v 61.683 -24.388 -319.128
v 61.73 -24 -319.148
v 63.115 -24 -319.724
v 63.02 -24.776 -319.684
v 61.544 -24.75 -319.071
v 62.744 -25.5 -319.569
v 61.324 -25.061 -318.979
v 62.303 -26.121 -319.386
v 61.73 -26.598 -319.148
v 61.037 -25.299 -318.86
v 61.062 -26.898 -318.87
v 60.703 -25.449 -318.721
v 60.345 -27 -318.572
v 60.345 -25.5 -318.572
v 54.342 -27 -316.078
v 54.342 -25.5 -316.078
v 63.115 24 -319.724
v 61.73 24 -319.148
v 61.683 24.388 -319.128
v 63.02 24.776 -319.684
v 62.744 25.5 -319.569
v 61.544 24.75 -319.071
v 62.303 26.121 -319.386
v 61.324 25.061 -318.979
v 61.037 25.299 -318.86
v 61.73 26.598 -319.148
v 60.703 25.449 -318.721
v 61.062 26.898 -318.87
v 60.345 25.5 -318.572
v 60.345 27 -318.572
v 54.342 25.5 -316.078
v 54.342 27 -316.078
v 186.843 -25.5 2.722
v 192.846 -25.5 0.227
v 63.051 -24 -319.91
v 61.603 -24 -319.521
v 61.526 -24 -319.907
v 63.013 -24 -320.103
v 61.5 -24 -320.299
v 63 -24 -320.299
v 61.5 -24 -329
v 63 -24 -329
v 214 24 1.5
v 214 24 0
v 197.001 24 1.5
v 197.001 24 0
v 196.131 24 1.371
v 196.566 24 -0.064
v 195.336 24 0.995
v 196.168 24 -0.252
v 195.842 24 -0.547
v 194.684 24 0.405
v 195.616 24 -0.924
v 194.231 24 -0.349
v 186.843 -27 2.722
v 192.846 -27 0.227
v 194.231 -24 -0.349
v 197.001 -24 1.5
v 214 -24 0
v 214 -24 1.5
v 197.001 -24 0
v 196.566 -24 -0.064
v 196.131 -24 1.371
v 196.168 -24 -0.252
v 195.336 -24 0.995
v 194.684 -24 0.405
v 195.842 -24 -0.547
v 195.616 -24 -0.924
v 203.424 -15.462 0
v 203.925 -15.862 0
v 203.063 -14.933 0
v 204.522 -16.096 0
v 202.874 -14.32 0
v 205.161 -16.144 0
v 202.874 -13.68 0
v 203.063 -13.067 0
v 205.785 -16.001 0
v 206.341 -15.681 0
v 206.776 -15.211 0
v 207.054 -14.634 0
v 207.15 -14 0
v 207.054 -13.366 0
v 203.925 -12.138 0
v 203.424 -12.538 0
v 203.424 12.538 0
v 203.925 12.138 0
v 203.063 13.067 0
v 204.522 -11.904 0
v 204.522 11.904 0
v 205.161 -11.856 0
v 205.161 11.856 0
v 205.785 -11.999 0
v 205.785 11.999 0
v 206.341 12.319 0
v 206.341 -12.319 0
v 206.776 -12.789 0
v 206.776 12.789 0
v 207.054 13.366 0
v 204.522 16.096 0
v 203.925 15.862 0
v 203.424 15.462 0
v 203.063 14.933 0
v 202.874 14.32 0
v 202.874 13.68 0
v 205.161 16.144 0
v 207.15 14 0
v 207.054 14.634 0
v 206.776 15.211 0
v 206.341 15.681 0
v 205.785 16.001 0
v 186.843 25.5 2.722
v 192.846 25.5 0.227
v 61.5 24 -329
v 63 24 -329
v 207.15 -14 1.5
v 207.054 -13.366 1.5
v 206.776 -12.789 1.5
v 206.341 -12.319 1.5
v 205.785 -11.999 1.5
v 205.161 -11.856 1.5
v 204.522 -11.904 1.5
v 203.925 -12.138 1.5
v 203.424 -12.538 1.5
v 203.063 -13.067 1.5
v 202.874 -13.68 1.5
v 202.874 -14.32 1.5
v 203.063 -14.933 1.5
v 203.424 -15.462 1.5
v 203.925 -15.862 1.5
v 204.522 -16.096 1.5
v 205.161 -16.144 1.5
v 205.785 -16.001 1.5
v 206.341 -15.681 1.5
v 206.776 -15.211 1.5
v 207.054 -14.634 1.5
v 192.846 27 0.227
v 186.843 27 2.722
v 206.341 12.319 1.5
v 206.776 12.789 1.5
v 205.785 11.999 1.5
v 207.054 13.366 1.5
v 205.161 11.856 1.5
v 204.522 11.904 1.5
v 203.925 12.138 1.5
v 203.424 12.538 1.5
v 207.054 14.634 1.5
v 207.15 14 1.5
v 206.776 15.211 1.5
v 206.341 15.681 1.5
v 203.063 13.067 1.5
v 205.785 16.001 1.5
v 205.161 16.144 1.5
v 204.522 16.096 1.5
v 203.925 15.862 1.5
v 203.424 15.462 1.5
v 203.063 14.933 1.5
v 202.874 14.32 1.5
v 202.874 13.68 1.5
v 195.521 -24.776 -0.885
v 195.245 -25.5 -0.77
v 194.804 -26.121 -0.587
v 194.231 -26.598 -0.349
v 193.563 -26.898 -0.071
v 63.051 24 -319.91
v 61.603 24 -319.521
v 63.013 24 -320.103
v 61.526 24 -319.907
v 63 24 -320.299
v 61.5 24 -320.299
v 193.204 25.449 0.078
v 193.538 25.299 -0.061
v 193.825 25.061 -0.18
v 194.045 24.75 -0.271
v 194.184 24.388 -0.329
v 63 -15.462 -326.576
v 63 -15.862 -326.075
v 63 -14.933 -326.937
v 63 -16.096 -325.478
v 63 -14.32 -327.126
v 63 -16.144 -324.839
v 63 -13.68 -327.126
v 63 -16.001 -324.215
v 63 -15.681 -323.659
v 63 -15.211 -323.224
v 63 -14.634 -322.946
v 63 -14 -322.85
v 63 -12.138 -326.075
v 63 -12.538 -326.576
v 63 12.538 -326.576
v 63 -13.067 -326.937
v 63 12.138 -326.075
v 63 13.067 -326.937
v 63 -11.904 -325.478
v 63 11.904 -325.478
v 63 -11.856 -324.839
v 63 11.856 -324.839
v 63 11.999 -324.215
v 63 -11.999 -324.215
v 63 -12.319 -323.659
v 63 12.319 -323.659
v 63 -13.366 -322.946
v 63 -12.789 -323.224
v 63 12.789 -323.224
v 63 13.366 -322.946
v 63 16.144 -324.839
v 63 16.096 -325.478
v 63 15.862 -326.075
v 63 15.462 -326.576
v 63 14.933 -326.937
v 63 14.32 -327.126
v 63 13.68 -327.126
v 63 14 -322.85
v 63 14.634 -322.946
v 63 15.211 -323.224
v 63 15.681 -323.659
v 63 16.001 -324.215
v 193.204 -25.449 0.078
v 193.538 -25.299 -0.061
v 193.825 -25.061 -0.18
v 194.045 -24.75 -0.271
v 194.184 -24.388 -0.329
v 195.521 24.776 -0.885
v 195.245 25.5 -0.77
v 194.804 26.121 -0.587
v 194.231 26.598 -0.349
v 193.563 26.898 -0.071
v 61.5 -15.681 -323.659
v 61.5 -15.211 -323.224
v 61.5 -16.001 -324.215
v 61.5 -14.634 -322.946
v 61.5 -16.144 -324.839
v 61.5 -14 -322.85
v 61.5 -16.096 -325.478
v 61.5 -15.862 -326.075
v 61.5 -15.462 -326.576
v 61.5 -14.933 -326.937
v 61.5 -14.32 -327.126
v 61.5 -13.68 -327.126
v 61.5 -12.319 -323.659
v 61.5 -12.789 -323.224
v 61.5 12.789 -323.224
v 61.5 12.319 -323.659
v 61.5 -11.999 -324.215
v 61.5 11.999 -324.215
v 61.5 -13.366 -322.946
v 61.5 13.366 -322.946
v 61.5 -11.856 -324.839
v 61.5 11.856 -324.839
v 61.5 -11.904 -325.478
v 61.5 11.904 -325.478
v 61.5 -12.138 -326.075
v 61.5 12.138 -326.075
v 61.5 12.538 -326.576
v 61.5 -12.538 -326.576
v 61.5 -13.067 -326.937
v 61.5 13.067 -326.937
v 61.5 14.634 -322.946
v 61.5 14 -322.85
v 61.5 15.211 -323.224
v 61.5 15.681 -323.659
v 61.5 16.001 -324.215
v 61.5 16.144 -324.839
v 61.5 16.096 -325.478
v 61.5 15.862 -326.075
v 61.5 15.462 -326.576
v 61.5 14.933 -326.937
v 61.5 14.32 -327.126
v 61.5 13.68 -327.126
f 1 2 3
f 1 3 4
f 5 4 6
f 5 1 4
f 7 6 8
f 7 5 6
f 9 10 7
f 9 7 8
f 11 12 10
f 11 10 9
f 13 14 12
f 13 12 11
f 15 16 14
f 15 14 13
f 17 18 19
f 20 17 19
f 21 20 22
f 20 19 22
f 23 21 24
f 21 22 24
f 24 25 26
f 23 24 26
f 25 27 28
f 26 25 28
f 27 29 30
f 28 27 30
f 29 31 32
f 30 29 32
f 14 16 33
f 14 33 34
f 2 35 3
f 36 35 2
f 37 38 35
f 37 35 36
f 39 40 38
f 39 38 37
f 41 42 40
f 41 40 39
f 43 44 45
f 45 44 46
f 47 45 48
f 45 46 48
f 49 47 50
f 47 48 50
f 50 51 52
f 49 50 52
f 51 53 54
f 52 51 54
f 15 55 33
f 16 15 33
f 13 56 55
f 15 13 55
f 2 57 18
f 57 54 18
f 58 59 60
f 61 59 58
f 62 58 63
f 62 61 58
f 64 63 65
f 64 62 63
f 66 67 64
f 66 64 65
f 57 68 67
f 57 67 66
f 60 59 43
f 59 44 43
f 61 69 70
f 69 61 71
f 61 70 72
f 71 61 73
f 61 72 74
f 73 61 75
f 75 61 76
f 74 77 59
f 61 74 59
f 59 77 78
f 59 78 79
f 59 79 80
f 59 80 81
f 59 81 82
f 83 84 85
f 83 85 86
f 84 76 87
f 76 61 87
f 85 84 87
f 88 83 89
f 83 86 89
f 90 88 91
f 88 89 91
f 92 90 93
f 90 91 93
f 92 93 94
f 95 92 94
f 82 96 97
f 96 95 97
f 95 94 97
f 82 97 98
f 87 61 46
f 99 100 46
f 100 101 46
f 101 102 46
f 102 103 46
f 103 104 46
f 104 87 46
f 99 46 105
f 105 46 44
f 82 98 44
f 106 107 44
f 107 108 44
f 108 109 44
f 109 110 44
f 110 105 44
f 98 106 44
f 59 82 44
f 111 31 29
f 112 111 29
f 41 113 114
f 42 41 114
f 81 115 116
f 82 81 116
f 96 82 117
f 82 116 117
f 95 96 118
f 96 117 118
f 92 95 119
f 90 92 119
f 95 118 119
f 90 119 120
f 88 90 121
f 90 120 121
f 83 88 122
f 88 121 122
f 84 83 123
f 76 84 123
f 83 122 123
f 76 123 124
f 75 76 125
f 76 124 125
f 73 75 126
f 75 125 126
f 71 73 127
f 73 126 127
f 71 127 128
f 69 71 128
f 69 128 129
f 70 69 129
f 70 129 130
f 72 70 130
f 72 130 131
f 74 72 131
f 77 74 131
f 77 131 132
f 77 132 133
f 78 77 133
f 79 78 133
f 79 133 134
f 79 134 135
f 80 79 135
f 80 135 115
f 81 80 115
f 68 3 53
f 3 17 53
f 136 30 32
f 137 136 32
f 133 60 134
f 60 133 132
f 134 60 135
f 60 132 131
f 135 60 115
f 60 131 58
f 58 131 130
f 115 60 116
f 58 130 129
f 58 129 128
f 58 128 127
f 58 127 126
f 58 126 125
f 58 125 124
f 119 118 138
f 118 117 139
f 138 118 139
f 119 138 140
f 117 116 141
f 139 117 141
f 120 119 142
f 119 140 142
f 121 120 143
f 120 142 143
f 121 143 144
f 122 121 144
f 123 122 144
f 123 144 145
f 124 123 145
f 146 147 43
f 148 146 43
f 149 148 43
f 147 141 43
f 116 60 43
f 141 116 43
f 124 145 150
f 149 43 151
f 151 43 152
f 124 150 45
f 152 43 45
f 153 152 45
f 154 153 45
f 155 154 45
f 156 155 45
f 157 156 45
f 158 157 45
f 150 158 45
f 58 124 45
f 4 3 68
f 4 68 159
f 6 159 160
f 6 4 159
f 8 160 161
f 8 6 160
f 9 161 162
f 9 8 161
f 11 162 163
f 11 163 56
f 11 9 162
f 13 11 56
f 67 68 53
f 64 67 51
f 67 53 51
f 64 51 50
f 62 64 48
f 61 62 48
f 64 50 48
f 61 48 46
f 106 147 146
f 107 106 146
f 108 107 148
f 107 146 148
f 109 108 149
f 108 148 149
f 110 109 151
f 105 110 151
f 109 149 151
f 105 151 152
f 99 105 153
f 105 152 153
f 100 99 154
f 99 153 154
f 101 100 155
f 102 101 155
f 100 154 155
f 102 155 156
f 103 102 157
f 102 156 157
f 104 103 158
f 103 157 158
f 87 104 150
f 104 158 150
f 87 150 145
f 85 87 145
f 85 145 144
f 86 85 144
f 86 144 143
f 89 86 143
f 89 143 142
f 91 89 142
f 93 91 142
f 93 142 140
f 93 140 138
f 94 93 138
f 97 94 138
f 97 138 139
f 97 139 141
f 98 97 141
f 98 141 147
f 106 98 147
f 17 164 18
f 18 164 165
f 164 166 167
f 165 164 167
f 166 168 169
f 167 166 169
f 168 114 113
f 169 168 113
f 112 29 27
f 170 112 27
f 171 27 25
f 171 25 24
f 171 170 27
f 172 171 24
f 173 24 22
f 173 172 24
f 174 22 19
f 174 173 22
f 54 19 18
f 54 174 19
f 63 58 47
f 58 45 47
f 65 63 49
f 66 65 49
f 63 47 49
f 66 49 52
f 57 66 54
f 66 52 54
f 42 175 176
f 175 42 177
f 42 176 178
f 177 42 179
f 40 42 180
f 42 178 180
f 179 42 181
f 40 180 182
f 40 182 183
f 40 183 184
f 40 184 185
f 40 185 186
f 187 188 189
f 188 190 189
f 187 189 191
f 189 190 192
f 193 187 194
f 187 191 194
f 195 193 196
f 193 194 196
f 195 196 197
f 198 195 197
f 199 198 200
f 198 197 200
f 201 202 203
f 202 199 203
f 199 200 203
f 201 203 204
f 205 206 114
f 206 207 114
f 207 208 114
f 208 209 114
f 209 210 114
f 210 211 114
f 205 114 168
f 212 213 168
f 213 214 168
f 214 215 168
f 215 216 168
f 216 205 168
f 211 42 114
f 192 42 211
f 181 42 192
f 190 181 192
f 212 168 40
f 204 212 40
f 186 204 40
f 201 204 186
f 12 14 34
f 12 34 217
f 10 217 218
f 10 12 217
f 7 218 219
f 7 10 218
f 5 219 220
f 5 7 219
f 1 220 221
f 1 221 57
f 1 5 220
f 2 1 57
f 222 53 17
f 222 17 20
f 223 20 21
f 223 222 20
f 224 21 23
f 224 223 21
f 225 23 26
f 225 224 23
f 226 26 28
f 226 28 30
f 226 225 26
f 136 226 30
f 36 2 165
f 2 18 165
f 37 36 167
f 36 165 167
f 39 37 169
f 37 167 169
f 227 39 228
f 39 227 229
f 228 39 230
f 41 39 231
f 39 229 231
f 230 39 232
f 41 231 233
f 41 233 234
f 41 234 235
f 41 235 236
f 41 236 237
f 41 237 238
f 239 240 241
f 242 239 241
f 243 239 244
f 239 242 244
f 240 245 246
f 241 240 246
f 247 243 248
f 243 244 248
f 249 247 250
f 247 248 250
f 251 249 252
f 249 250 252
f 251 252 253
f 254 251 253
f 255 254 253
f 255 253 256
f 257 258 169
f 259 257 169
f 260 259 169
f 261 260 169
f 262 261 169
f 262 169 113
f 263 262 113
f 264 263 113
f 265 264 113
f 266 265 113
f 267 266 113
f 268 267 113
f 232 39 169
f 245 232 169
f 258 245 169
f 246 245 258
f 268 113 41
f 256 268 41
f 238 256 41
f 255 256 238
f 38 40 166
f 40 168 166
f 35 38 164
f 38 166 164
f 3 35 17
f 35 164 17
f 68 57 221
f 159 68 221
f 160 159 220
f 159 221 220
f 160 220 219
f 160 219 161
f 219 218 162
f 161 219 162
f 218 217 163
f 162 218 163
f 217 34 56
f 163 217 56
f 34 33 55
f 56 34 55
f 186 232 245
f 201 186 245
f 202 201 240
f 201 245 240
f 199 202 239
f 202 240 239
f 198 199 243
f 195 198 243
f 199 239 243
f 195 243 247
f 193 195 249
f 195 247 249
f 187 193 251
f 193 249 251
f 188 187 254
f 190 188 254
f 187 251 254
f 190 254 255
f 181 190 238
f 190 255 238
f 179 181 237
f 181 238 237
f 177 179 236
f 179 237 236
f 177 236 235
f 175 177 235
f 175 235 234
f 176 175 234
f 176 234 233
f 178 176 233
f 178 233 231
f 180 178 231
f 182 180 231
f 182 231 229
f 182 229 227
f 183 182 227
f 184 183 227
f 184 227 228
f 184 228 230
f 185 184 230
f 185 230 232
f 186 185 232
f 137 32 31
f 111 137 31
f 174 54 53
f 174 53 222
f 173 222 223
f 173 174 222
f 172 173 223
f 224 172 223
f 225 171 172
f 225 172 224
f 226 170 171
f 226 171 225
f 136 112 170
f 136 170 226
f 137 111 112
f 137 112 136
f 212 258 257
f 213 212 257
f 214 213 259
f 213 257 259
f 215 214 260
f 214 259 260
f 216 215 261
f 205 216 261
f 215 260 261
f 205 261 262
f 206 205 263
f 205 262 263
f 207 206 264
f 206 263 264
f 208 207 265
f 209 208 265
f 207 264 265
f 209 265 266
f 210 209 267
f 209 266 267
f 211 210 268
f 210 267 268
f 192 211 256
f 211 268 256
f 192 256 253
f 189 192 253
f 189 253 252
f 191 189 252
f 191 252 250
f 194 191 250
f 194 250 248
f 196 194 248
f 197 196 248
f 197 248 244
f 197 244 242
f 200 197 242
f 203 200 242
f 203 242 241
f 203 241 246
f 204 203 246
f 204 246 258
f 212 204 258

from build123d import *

# Parameters (mm, degrees)
SM_BASE_FLANGE_1_DEPTH      = 24
SM_EDGE_FLANGE_1_DEPTH      = 345.238328462
SM_EDGE_FLANGE_1_BEND_DEPTH = 345.238328462
HOLE_WIZARD_M4_3_D          = 4.3
HOLE_WIZARD_M4_4_D          = 4.3


# Sheet-metal steps are written as plain solids
with BuildPart() as part:
    # Sketch 1 → 基体-法兰1 (new, symmetric)
    with BuildSketch(Plane(origin=(0, 0, 0), x_dir=(1, 0, 0), z_dir=(0, 1, 0))):
        with BuildLine():
            Line((63, 329), (63, 320.299307498))
            ThreePointArc((63, 320.299307498), (63.028998532, 320.005786319), (63.11487291, 319.723614051))
            Line((63.11487291, 319.723614051), (195.615835089, 0.924306553))
            ThreePointArc((195.615835089, 0.924306553), (196.168357882, 0.252294071), (197.000962179, 0))
            Line((197.000962179, 0), (214, 0))
            Line((214, 0), (214, -1.5))
            Line((214, -1.5), (197.000962179, -1.5))
            ThreePointArc((197.000962179, -1.5), (195.335753585, -0.995411858), (194.230707999, 0.348613106))
            Line((194.230707999, 0.348613106), (61.72974582, 319.147920604))
            ThreePointArc((61.72974582, 319.147920604), (61.557997065, 319.71226514), (61.5, 320.299307498))
            Line((61.5, 320.299307498), (61.5, 329))
            Line((61.5, 329), (63, 329))
        make_face()
    extrude(amount=SM_BASE_FLANGE_1_DEPTH, both=True)

    # 边线-法兰1 section (across the edge) → 边线-法兰1 (add)
    with BuildSketch(Plane(origin=(194.230707999, 25.5, -0.348613106), x_dir=(0, -1, 0), z_dir=(-0.3837956311773727, 0, -0.9234180599756332))):
        with BuildLine():
            Line((-1.5, 1.5), (-1.5, 8))
            Line((-1.5, 8), (0, 8))
            Line((0, 8), (0, 1.5))
            ThreePointArc((0, 1.5), (0.439339828, 0.439339828), (1.5, 0))
            Line((1.5, 0), (1.5, -1.5))
            ThreePointArc((1.5, -1.5), (-0.621320344, -0.621320344), (-1.5, 1.5))
        make_face()
    extrude(amount=SM_EDGE_FLANGE_1_DEPTH)

    # 边线-法兰1 section 2 (across the edge) → 边线-法兰1 bend (add)
    with BuildSketch(Plane(origin=(61.72974582, -25.5, -319.147920604), x_dir=(0, 1, 0), z_dir=(0.3837956311773727, 0, 0.9234180599756332))):
        with BuildLine():
            Line((-1.5, 1.5), (-1.5, 8))
            Line((-1.5, 8), (0, 8))
            Line((0, 8), (0, 1.5))
            ThreePointArc((0, 1.5), (0.439339828, 0.439339828), (1.5, 0))
            Line((1.5, 0), (1.5, -1.5))
            ThreePointArc((1.5, -1.5), (-0.621320344, -0.621320344), (-1.5, 1.5))
        make_face()
    extrude(amount=SM_EDGE_FLANGE_1_BEND_DEPTH)

    # M4 间隙槽口3 (through all)
    with Locations(Plane(origin=(63, 0, 0), x_dir=(0, 0, -1), z_dir=(1, 0, 0))):
        with Locations((325, 14), (325, -14)):
            Hole(HOLE_WIZARD_M4_3_D / 2)

    # M4 间隙槽口4 (through all)
    with Locations(Plane(origin=(0, 0, 0), x_dir=(-1, 0, 0), z_dir=(0, 0, -1))):
        with Locations((-205, 14), (-205, -14)):
            Hole(HOLE_WIZARD_M4_4_D / 2)


solid = part.part
